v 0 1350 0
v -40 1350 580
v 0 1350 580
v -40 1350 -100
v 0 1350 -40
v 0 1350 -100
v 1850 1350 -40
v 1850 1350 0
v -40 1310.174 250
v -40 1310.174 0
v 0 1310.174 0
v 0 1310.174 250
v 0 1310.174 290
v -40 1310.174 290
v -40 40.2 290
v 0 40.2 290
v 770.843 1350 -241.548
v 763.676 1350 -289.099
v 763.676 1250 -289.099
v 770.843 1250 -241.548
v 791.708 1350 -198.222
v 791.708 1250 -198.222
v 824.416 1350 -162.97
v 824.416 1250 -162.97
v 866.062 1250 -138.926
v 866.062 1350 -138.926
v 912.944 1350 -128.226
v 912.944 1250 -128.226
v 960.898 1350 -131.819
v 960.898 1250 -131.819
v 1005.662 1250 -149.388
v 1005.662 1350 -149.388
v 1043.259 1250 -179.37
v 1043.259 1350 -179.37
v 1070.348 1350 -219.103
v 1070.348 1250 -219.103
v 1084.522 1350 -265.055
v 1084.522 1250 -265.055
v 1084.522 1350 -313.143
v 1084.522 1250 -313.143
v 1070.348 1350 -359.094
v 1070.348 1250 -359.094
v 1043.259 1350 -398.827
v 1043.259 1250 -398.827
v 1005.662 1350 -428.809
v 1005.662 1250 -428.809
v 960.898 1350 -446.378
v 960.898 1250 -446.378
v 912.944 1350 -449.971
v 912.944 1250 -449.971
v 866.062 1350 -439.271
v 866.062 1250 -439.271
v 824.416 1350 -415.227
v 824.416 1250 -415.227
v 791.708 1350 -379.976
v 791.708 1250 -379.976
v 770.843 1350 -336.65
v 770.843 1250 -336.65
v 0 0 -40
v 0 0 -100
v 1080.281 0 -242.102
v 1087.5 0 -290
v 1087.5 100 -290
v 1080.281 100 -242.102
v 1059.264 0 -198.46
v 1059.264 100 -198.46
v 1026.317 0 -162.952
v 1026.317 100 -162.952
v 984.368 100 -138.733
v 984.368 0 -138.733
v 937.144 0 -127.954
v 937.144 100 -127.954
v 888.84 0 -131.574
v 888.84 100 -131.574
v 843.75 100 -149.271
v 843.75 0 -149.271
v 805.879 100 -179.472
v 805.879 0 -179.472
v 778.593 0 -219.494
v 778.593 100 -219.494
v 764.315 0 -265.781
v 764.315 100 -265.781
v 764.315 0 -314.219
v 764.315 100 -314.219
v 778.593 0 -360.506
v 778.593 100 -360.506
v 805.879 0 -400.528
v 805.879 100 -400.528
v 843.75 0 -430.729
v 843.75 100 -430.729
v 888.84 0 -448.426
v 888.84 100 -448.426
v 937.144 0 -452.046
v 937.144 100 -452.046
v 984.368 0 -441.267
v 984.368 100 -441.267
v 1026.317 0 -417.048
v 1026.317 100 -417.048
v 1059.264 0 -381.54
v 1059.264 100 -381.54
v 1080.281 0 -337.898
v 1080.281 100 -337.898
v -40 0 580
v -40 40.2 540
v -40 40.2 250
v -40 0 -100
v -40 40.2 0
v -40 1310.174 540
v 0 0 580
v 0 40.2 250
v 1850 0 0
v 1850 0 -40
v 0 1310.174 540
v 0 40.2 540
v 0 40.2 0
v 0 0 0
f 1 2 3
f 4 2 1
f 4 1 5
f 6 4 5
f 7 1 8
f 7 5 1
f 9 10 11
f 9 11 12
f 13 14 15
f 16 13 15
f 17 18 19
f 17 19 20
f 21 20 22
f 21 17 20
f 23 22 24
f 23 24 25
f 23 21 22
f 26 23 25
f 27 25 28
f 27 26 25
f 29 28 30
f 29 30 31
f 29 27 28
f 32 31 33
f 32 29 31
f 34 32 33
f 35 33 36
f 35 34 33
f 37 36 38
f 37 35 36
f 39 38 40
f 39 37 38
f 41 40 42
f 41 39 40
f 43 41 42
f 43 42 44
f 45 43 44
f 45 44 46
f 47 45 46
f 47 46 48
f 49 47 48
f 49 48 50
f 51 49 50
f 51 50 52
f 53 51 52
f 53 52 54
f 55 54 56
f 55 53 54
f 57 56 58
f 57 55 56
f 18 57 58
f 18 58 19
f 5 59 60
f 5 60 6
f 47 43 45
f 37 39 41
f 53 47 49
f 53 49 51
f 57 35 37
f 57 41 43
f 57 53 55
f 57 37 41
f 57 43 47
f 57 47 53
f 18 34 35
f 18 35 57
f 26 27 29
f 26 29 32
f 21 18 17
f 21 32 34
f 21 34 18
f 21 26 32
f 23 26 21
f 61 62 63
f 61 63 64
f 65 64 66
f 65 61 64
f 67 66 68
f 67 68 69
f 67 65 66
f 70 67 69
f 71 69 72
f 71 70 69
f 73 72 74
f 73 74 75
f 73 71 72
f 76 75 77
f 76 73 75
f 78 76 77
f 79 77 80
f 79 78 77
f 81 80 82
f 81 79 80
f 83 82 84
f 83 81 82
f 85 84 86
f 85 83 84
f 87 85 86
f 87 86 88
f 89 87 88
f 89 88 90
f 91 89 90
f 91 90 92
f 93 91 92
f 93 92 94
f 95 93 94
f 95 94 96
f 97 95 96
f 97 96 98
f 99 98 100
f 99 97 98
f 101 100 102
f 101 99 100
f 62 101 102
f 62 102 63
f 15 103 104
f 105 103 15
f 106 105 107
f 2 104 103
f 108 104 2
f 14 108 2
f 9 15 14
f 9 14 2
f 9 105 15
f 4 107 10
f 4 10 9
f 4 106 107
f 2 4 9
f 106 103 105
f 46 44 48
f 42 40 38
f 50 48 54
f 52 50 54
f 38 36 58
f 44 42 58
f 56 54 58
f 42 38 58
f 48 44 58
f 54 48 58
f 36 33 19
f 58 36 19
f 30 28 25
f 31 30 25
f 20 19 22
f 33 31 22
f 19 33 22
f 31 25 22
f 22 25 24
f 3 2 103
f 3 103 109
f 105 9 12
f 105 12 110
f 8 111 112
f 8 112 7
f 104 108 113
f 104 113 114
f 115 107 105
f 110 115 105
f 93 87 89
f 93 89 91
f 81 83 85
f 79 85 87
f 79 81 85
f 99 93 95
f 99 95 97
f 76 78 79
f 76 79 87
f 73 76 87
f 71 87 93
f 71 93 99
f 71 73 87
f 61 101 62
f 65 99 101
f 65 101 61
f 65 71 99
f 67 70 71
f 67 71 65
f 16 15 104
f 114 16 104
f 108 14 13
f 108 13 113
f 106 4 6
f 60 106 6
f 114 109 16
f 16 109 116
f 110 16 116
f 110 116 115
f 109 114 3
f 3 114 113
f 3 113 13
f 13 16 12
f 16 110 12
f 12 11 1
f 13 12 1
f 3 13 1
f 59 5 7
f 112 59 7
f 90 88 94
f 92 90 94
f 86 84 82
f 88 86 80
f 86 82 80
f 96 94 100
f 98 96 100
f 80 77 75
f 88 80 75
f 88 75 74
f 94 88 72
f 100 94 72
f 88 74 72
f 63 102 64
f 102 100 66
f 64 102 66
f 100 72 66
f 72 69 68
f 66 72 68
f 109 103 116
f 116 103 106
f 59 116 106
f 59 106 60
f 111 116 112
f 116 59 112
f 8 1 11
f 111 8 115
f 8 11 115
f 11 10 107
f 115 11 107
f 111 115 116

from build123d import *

# Parameters (mm, degrees)
F0_W          = 1850
F0_H          = 1350
F1_DEPTH      = 40
F2_W          = 40
F2_H          = 1350
F3_DEPTH      = 100
F3_DEPTH_BACK = 580
F4_R          = 162.5
F5_DEPTH      = 100
F6_R          = 161.3239006066
F7_DEPTH      = 100
F8_W          = 1269.9743546546
F8_H          = 250
F9_DEPTH      = 100
F10_DEPTH     = 100


with BuildPart() as f1:
    # F0 (on Top) → F1 (new body)
    with BuildSketch(Plane.XY):
        with Locations((925, 675)):
            Rectangle(F0_W, F0_H)
    extrude(amount=-F1_DEPTH)

    # F2 (on Top) → F3 (join, two sides)
    with BuildSketch(Plane.XY) as f3_sk:
        with Locations((-20, 675)):
            Rectangle(F2_W, F2_H)
    extrude(amount=-F3_DEPTH)
    extrude(f3_sk.sketch, amount=F3_DEPTH_BACK)

    # F8 (on face) → F9 (cut)
    with BuildSketch(Plane(origin=(-40, 0, 0), x_dir=(0, -1, 0), z_dir=(-1, 0, 0))):
        with Locations((-675.186811015, 415)):
            Rectangle(F8_W, F8_H)
    extrude(amount=-F9_DEPTH, mode=Mode.SUBTRACT)

    # F8 (on face) → F10 (cut)
    with BuildSketch(Plane(origin=(-40, 0, 0), x_dir=(0, -1, 0), z_dir=(-1, 0, 0))):
        with Locations((-675.186811015, 415)):
            Rectangle(F8_W, F8_H)
        with Locations((-675.186811015, 125)):
            Rectangle(F8_W, F8_H)
    extrude(amount=-F10_DEPTH, mode=Mode.SUBTRACT)


with BuildPart() as f5:
    # F4 (on face) → F5 (new body)
    with BuildSketch(Plane.XZ):
        with Locations((925, -290)):
            Circle(F4_R)
    extrude(amount=-F5_DEPTH)


with BuildPart() as f7:
    # F6 (on face) → F7 (new body)
    with BuildSketch(Plane(origin=(0, 1350, 0), x_dir=(-1, 0, 0), z_dir=(0, 1, 0))):
        with Locations((-925, -289.0985906124)):
            Circle(F6_R)
    extrude(amount=-F7_DEPTH)


solid = Compound([f1.part, f5.part, f7.part])
